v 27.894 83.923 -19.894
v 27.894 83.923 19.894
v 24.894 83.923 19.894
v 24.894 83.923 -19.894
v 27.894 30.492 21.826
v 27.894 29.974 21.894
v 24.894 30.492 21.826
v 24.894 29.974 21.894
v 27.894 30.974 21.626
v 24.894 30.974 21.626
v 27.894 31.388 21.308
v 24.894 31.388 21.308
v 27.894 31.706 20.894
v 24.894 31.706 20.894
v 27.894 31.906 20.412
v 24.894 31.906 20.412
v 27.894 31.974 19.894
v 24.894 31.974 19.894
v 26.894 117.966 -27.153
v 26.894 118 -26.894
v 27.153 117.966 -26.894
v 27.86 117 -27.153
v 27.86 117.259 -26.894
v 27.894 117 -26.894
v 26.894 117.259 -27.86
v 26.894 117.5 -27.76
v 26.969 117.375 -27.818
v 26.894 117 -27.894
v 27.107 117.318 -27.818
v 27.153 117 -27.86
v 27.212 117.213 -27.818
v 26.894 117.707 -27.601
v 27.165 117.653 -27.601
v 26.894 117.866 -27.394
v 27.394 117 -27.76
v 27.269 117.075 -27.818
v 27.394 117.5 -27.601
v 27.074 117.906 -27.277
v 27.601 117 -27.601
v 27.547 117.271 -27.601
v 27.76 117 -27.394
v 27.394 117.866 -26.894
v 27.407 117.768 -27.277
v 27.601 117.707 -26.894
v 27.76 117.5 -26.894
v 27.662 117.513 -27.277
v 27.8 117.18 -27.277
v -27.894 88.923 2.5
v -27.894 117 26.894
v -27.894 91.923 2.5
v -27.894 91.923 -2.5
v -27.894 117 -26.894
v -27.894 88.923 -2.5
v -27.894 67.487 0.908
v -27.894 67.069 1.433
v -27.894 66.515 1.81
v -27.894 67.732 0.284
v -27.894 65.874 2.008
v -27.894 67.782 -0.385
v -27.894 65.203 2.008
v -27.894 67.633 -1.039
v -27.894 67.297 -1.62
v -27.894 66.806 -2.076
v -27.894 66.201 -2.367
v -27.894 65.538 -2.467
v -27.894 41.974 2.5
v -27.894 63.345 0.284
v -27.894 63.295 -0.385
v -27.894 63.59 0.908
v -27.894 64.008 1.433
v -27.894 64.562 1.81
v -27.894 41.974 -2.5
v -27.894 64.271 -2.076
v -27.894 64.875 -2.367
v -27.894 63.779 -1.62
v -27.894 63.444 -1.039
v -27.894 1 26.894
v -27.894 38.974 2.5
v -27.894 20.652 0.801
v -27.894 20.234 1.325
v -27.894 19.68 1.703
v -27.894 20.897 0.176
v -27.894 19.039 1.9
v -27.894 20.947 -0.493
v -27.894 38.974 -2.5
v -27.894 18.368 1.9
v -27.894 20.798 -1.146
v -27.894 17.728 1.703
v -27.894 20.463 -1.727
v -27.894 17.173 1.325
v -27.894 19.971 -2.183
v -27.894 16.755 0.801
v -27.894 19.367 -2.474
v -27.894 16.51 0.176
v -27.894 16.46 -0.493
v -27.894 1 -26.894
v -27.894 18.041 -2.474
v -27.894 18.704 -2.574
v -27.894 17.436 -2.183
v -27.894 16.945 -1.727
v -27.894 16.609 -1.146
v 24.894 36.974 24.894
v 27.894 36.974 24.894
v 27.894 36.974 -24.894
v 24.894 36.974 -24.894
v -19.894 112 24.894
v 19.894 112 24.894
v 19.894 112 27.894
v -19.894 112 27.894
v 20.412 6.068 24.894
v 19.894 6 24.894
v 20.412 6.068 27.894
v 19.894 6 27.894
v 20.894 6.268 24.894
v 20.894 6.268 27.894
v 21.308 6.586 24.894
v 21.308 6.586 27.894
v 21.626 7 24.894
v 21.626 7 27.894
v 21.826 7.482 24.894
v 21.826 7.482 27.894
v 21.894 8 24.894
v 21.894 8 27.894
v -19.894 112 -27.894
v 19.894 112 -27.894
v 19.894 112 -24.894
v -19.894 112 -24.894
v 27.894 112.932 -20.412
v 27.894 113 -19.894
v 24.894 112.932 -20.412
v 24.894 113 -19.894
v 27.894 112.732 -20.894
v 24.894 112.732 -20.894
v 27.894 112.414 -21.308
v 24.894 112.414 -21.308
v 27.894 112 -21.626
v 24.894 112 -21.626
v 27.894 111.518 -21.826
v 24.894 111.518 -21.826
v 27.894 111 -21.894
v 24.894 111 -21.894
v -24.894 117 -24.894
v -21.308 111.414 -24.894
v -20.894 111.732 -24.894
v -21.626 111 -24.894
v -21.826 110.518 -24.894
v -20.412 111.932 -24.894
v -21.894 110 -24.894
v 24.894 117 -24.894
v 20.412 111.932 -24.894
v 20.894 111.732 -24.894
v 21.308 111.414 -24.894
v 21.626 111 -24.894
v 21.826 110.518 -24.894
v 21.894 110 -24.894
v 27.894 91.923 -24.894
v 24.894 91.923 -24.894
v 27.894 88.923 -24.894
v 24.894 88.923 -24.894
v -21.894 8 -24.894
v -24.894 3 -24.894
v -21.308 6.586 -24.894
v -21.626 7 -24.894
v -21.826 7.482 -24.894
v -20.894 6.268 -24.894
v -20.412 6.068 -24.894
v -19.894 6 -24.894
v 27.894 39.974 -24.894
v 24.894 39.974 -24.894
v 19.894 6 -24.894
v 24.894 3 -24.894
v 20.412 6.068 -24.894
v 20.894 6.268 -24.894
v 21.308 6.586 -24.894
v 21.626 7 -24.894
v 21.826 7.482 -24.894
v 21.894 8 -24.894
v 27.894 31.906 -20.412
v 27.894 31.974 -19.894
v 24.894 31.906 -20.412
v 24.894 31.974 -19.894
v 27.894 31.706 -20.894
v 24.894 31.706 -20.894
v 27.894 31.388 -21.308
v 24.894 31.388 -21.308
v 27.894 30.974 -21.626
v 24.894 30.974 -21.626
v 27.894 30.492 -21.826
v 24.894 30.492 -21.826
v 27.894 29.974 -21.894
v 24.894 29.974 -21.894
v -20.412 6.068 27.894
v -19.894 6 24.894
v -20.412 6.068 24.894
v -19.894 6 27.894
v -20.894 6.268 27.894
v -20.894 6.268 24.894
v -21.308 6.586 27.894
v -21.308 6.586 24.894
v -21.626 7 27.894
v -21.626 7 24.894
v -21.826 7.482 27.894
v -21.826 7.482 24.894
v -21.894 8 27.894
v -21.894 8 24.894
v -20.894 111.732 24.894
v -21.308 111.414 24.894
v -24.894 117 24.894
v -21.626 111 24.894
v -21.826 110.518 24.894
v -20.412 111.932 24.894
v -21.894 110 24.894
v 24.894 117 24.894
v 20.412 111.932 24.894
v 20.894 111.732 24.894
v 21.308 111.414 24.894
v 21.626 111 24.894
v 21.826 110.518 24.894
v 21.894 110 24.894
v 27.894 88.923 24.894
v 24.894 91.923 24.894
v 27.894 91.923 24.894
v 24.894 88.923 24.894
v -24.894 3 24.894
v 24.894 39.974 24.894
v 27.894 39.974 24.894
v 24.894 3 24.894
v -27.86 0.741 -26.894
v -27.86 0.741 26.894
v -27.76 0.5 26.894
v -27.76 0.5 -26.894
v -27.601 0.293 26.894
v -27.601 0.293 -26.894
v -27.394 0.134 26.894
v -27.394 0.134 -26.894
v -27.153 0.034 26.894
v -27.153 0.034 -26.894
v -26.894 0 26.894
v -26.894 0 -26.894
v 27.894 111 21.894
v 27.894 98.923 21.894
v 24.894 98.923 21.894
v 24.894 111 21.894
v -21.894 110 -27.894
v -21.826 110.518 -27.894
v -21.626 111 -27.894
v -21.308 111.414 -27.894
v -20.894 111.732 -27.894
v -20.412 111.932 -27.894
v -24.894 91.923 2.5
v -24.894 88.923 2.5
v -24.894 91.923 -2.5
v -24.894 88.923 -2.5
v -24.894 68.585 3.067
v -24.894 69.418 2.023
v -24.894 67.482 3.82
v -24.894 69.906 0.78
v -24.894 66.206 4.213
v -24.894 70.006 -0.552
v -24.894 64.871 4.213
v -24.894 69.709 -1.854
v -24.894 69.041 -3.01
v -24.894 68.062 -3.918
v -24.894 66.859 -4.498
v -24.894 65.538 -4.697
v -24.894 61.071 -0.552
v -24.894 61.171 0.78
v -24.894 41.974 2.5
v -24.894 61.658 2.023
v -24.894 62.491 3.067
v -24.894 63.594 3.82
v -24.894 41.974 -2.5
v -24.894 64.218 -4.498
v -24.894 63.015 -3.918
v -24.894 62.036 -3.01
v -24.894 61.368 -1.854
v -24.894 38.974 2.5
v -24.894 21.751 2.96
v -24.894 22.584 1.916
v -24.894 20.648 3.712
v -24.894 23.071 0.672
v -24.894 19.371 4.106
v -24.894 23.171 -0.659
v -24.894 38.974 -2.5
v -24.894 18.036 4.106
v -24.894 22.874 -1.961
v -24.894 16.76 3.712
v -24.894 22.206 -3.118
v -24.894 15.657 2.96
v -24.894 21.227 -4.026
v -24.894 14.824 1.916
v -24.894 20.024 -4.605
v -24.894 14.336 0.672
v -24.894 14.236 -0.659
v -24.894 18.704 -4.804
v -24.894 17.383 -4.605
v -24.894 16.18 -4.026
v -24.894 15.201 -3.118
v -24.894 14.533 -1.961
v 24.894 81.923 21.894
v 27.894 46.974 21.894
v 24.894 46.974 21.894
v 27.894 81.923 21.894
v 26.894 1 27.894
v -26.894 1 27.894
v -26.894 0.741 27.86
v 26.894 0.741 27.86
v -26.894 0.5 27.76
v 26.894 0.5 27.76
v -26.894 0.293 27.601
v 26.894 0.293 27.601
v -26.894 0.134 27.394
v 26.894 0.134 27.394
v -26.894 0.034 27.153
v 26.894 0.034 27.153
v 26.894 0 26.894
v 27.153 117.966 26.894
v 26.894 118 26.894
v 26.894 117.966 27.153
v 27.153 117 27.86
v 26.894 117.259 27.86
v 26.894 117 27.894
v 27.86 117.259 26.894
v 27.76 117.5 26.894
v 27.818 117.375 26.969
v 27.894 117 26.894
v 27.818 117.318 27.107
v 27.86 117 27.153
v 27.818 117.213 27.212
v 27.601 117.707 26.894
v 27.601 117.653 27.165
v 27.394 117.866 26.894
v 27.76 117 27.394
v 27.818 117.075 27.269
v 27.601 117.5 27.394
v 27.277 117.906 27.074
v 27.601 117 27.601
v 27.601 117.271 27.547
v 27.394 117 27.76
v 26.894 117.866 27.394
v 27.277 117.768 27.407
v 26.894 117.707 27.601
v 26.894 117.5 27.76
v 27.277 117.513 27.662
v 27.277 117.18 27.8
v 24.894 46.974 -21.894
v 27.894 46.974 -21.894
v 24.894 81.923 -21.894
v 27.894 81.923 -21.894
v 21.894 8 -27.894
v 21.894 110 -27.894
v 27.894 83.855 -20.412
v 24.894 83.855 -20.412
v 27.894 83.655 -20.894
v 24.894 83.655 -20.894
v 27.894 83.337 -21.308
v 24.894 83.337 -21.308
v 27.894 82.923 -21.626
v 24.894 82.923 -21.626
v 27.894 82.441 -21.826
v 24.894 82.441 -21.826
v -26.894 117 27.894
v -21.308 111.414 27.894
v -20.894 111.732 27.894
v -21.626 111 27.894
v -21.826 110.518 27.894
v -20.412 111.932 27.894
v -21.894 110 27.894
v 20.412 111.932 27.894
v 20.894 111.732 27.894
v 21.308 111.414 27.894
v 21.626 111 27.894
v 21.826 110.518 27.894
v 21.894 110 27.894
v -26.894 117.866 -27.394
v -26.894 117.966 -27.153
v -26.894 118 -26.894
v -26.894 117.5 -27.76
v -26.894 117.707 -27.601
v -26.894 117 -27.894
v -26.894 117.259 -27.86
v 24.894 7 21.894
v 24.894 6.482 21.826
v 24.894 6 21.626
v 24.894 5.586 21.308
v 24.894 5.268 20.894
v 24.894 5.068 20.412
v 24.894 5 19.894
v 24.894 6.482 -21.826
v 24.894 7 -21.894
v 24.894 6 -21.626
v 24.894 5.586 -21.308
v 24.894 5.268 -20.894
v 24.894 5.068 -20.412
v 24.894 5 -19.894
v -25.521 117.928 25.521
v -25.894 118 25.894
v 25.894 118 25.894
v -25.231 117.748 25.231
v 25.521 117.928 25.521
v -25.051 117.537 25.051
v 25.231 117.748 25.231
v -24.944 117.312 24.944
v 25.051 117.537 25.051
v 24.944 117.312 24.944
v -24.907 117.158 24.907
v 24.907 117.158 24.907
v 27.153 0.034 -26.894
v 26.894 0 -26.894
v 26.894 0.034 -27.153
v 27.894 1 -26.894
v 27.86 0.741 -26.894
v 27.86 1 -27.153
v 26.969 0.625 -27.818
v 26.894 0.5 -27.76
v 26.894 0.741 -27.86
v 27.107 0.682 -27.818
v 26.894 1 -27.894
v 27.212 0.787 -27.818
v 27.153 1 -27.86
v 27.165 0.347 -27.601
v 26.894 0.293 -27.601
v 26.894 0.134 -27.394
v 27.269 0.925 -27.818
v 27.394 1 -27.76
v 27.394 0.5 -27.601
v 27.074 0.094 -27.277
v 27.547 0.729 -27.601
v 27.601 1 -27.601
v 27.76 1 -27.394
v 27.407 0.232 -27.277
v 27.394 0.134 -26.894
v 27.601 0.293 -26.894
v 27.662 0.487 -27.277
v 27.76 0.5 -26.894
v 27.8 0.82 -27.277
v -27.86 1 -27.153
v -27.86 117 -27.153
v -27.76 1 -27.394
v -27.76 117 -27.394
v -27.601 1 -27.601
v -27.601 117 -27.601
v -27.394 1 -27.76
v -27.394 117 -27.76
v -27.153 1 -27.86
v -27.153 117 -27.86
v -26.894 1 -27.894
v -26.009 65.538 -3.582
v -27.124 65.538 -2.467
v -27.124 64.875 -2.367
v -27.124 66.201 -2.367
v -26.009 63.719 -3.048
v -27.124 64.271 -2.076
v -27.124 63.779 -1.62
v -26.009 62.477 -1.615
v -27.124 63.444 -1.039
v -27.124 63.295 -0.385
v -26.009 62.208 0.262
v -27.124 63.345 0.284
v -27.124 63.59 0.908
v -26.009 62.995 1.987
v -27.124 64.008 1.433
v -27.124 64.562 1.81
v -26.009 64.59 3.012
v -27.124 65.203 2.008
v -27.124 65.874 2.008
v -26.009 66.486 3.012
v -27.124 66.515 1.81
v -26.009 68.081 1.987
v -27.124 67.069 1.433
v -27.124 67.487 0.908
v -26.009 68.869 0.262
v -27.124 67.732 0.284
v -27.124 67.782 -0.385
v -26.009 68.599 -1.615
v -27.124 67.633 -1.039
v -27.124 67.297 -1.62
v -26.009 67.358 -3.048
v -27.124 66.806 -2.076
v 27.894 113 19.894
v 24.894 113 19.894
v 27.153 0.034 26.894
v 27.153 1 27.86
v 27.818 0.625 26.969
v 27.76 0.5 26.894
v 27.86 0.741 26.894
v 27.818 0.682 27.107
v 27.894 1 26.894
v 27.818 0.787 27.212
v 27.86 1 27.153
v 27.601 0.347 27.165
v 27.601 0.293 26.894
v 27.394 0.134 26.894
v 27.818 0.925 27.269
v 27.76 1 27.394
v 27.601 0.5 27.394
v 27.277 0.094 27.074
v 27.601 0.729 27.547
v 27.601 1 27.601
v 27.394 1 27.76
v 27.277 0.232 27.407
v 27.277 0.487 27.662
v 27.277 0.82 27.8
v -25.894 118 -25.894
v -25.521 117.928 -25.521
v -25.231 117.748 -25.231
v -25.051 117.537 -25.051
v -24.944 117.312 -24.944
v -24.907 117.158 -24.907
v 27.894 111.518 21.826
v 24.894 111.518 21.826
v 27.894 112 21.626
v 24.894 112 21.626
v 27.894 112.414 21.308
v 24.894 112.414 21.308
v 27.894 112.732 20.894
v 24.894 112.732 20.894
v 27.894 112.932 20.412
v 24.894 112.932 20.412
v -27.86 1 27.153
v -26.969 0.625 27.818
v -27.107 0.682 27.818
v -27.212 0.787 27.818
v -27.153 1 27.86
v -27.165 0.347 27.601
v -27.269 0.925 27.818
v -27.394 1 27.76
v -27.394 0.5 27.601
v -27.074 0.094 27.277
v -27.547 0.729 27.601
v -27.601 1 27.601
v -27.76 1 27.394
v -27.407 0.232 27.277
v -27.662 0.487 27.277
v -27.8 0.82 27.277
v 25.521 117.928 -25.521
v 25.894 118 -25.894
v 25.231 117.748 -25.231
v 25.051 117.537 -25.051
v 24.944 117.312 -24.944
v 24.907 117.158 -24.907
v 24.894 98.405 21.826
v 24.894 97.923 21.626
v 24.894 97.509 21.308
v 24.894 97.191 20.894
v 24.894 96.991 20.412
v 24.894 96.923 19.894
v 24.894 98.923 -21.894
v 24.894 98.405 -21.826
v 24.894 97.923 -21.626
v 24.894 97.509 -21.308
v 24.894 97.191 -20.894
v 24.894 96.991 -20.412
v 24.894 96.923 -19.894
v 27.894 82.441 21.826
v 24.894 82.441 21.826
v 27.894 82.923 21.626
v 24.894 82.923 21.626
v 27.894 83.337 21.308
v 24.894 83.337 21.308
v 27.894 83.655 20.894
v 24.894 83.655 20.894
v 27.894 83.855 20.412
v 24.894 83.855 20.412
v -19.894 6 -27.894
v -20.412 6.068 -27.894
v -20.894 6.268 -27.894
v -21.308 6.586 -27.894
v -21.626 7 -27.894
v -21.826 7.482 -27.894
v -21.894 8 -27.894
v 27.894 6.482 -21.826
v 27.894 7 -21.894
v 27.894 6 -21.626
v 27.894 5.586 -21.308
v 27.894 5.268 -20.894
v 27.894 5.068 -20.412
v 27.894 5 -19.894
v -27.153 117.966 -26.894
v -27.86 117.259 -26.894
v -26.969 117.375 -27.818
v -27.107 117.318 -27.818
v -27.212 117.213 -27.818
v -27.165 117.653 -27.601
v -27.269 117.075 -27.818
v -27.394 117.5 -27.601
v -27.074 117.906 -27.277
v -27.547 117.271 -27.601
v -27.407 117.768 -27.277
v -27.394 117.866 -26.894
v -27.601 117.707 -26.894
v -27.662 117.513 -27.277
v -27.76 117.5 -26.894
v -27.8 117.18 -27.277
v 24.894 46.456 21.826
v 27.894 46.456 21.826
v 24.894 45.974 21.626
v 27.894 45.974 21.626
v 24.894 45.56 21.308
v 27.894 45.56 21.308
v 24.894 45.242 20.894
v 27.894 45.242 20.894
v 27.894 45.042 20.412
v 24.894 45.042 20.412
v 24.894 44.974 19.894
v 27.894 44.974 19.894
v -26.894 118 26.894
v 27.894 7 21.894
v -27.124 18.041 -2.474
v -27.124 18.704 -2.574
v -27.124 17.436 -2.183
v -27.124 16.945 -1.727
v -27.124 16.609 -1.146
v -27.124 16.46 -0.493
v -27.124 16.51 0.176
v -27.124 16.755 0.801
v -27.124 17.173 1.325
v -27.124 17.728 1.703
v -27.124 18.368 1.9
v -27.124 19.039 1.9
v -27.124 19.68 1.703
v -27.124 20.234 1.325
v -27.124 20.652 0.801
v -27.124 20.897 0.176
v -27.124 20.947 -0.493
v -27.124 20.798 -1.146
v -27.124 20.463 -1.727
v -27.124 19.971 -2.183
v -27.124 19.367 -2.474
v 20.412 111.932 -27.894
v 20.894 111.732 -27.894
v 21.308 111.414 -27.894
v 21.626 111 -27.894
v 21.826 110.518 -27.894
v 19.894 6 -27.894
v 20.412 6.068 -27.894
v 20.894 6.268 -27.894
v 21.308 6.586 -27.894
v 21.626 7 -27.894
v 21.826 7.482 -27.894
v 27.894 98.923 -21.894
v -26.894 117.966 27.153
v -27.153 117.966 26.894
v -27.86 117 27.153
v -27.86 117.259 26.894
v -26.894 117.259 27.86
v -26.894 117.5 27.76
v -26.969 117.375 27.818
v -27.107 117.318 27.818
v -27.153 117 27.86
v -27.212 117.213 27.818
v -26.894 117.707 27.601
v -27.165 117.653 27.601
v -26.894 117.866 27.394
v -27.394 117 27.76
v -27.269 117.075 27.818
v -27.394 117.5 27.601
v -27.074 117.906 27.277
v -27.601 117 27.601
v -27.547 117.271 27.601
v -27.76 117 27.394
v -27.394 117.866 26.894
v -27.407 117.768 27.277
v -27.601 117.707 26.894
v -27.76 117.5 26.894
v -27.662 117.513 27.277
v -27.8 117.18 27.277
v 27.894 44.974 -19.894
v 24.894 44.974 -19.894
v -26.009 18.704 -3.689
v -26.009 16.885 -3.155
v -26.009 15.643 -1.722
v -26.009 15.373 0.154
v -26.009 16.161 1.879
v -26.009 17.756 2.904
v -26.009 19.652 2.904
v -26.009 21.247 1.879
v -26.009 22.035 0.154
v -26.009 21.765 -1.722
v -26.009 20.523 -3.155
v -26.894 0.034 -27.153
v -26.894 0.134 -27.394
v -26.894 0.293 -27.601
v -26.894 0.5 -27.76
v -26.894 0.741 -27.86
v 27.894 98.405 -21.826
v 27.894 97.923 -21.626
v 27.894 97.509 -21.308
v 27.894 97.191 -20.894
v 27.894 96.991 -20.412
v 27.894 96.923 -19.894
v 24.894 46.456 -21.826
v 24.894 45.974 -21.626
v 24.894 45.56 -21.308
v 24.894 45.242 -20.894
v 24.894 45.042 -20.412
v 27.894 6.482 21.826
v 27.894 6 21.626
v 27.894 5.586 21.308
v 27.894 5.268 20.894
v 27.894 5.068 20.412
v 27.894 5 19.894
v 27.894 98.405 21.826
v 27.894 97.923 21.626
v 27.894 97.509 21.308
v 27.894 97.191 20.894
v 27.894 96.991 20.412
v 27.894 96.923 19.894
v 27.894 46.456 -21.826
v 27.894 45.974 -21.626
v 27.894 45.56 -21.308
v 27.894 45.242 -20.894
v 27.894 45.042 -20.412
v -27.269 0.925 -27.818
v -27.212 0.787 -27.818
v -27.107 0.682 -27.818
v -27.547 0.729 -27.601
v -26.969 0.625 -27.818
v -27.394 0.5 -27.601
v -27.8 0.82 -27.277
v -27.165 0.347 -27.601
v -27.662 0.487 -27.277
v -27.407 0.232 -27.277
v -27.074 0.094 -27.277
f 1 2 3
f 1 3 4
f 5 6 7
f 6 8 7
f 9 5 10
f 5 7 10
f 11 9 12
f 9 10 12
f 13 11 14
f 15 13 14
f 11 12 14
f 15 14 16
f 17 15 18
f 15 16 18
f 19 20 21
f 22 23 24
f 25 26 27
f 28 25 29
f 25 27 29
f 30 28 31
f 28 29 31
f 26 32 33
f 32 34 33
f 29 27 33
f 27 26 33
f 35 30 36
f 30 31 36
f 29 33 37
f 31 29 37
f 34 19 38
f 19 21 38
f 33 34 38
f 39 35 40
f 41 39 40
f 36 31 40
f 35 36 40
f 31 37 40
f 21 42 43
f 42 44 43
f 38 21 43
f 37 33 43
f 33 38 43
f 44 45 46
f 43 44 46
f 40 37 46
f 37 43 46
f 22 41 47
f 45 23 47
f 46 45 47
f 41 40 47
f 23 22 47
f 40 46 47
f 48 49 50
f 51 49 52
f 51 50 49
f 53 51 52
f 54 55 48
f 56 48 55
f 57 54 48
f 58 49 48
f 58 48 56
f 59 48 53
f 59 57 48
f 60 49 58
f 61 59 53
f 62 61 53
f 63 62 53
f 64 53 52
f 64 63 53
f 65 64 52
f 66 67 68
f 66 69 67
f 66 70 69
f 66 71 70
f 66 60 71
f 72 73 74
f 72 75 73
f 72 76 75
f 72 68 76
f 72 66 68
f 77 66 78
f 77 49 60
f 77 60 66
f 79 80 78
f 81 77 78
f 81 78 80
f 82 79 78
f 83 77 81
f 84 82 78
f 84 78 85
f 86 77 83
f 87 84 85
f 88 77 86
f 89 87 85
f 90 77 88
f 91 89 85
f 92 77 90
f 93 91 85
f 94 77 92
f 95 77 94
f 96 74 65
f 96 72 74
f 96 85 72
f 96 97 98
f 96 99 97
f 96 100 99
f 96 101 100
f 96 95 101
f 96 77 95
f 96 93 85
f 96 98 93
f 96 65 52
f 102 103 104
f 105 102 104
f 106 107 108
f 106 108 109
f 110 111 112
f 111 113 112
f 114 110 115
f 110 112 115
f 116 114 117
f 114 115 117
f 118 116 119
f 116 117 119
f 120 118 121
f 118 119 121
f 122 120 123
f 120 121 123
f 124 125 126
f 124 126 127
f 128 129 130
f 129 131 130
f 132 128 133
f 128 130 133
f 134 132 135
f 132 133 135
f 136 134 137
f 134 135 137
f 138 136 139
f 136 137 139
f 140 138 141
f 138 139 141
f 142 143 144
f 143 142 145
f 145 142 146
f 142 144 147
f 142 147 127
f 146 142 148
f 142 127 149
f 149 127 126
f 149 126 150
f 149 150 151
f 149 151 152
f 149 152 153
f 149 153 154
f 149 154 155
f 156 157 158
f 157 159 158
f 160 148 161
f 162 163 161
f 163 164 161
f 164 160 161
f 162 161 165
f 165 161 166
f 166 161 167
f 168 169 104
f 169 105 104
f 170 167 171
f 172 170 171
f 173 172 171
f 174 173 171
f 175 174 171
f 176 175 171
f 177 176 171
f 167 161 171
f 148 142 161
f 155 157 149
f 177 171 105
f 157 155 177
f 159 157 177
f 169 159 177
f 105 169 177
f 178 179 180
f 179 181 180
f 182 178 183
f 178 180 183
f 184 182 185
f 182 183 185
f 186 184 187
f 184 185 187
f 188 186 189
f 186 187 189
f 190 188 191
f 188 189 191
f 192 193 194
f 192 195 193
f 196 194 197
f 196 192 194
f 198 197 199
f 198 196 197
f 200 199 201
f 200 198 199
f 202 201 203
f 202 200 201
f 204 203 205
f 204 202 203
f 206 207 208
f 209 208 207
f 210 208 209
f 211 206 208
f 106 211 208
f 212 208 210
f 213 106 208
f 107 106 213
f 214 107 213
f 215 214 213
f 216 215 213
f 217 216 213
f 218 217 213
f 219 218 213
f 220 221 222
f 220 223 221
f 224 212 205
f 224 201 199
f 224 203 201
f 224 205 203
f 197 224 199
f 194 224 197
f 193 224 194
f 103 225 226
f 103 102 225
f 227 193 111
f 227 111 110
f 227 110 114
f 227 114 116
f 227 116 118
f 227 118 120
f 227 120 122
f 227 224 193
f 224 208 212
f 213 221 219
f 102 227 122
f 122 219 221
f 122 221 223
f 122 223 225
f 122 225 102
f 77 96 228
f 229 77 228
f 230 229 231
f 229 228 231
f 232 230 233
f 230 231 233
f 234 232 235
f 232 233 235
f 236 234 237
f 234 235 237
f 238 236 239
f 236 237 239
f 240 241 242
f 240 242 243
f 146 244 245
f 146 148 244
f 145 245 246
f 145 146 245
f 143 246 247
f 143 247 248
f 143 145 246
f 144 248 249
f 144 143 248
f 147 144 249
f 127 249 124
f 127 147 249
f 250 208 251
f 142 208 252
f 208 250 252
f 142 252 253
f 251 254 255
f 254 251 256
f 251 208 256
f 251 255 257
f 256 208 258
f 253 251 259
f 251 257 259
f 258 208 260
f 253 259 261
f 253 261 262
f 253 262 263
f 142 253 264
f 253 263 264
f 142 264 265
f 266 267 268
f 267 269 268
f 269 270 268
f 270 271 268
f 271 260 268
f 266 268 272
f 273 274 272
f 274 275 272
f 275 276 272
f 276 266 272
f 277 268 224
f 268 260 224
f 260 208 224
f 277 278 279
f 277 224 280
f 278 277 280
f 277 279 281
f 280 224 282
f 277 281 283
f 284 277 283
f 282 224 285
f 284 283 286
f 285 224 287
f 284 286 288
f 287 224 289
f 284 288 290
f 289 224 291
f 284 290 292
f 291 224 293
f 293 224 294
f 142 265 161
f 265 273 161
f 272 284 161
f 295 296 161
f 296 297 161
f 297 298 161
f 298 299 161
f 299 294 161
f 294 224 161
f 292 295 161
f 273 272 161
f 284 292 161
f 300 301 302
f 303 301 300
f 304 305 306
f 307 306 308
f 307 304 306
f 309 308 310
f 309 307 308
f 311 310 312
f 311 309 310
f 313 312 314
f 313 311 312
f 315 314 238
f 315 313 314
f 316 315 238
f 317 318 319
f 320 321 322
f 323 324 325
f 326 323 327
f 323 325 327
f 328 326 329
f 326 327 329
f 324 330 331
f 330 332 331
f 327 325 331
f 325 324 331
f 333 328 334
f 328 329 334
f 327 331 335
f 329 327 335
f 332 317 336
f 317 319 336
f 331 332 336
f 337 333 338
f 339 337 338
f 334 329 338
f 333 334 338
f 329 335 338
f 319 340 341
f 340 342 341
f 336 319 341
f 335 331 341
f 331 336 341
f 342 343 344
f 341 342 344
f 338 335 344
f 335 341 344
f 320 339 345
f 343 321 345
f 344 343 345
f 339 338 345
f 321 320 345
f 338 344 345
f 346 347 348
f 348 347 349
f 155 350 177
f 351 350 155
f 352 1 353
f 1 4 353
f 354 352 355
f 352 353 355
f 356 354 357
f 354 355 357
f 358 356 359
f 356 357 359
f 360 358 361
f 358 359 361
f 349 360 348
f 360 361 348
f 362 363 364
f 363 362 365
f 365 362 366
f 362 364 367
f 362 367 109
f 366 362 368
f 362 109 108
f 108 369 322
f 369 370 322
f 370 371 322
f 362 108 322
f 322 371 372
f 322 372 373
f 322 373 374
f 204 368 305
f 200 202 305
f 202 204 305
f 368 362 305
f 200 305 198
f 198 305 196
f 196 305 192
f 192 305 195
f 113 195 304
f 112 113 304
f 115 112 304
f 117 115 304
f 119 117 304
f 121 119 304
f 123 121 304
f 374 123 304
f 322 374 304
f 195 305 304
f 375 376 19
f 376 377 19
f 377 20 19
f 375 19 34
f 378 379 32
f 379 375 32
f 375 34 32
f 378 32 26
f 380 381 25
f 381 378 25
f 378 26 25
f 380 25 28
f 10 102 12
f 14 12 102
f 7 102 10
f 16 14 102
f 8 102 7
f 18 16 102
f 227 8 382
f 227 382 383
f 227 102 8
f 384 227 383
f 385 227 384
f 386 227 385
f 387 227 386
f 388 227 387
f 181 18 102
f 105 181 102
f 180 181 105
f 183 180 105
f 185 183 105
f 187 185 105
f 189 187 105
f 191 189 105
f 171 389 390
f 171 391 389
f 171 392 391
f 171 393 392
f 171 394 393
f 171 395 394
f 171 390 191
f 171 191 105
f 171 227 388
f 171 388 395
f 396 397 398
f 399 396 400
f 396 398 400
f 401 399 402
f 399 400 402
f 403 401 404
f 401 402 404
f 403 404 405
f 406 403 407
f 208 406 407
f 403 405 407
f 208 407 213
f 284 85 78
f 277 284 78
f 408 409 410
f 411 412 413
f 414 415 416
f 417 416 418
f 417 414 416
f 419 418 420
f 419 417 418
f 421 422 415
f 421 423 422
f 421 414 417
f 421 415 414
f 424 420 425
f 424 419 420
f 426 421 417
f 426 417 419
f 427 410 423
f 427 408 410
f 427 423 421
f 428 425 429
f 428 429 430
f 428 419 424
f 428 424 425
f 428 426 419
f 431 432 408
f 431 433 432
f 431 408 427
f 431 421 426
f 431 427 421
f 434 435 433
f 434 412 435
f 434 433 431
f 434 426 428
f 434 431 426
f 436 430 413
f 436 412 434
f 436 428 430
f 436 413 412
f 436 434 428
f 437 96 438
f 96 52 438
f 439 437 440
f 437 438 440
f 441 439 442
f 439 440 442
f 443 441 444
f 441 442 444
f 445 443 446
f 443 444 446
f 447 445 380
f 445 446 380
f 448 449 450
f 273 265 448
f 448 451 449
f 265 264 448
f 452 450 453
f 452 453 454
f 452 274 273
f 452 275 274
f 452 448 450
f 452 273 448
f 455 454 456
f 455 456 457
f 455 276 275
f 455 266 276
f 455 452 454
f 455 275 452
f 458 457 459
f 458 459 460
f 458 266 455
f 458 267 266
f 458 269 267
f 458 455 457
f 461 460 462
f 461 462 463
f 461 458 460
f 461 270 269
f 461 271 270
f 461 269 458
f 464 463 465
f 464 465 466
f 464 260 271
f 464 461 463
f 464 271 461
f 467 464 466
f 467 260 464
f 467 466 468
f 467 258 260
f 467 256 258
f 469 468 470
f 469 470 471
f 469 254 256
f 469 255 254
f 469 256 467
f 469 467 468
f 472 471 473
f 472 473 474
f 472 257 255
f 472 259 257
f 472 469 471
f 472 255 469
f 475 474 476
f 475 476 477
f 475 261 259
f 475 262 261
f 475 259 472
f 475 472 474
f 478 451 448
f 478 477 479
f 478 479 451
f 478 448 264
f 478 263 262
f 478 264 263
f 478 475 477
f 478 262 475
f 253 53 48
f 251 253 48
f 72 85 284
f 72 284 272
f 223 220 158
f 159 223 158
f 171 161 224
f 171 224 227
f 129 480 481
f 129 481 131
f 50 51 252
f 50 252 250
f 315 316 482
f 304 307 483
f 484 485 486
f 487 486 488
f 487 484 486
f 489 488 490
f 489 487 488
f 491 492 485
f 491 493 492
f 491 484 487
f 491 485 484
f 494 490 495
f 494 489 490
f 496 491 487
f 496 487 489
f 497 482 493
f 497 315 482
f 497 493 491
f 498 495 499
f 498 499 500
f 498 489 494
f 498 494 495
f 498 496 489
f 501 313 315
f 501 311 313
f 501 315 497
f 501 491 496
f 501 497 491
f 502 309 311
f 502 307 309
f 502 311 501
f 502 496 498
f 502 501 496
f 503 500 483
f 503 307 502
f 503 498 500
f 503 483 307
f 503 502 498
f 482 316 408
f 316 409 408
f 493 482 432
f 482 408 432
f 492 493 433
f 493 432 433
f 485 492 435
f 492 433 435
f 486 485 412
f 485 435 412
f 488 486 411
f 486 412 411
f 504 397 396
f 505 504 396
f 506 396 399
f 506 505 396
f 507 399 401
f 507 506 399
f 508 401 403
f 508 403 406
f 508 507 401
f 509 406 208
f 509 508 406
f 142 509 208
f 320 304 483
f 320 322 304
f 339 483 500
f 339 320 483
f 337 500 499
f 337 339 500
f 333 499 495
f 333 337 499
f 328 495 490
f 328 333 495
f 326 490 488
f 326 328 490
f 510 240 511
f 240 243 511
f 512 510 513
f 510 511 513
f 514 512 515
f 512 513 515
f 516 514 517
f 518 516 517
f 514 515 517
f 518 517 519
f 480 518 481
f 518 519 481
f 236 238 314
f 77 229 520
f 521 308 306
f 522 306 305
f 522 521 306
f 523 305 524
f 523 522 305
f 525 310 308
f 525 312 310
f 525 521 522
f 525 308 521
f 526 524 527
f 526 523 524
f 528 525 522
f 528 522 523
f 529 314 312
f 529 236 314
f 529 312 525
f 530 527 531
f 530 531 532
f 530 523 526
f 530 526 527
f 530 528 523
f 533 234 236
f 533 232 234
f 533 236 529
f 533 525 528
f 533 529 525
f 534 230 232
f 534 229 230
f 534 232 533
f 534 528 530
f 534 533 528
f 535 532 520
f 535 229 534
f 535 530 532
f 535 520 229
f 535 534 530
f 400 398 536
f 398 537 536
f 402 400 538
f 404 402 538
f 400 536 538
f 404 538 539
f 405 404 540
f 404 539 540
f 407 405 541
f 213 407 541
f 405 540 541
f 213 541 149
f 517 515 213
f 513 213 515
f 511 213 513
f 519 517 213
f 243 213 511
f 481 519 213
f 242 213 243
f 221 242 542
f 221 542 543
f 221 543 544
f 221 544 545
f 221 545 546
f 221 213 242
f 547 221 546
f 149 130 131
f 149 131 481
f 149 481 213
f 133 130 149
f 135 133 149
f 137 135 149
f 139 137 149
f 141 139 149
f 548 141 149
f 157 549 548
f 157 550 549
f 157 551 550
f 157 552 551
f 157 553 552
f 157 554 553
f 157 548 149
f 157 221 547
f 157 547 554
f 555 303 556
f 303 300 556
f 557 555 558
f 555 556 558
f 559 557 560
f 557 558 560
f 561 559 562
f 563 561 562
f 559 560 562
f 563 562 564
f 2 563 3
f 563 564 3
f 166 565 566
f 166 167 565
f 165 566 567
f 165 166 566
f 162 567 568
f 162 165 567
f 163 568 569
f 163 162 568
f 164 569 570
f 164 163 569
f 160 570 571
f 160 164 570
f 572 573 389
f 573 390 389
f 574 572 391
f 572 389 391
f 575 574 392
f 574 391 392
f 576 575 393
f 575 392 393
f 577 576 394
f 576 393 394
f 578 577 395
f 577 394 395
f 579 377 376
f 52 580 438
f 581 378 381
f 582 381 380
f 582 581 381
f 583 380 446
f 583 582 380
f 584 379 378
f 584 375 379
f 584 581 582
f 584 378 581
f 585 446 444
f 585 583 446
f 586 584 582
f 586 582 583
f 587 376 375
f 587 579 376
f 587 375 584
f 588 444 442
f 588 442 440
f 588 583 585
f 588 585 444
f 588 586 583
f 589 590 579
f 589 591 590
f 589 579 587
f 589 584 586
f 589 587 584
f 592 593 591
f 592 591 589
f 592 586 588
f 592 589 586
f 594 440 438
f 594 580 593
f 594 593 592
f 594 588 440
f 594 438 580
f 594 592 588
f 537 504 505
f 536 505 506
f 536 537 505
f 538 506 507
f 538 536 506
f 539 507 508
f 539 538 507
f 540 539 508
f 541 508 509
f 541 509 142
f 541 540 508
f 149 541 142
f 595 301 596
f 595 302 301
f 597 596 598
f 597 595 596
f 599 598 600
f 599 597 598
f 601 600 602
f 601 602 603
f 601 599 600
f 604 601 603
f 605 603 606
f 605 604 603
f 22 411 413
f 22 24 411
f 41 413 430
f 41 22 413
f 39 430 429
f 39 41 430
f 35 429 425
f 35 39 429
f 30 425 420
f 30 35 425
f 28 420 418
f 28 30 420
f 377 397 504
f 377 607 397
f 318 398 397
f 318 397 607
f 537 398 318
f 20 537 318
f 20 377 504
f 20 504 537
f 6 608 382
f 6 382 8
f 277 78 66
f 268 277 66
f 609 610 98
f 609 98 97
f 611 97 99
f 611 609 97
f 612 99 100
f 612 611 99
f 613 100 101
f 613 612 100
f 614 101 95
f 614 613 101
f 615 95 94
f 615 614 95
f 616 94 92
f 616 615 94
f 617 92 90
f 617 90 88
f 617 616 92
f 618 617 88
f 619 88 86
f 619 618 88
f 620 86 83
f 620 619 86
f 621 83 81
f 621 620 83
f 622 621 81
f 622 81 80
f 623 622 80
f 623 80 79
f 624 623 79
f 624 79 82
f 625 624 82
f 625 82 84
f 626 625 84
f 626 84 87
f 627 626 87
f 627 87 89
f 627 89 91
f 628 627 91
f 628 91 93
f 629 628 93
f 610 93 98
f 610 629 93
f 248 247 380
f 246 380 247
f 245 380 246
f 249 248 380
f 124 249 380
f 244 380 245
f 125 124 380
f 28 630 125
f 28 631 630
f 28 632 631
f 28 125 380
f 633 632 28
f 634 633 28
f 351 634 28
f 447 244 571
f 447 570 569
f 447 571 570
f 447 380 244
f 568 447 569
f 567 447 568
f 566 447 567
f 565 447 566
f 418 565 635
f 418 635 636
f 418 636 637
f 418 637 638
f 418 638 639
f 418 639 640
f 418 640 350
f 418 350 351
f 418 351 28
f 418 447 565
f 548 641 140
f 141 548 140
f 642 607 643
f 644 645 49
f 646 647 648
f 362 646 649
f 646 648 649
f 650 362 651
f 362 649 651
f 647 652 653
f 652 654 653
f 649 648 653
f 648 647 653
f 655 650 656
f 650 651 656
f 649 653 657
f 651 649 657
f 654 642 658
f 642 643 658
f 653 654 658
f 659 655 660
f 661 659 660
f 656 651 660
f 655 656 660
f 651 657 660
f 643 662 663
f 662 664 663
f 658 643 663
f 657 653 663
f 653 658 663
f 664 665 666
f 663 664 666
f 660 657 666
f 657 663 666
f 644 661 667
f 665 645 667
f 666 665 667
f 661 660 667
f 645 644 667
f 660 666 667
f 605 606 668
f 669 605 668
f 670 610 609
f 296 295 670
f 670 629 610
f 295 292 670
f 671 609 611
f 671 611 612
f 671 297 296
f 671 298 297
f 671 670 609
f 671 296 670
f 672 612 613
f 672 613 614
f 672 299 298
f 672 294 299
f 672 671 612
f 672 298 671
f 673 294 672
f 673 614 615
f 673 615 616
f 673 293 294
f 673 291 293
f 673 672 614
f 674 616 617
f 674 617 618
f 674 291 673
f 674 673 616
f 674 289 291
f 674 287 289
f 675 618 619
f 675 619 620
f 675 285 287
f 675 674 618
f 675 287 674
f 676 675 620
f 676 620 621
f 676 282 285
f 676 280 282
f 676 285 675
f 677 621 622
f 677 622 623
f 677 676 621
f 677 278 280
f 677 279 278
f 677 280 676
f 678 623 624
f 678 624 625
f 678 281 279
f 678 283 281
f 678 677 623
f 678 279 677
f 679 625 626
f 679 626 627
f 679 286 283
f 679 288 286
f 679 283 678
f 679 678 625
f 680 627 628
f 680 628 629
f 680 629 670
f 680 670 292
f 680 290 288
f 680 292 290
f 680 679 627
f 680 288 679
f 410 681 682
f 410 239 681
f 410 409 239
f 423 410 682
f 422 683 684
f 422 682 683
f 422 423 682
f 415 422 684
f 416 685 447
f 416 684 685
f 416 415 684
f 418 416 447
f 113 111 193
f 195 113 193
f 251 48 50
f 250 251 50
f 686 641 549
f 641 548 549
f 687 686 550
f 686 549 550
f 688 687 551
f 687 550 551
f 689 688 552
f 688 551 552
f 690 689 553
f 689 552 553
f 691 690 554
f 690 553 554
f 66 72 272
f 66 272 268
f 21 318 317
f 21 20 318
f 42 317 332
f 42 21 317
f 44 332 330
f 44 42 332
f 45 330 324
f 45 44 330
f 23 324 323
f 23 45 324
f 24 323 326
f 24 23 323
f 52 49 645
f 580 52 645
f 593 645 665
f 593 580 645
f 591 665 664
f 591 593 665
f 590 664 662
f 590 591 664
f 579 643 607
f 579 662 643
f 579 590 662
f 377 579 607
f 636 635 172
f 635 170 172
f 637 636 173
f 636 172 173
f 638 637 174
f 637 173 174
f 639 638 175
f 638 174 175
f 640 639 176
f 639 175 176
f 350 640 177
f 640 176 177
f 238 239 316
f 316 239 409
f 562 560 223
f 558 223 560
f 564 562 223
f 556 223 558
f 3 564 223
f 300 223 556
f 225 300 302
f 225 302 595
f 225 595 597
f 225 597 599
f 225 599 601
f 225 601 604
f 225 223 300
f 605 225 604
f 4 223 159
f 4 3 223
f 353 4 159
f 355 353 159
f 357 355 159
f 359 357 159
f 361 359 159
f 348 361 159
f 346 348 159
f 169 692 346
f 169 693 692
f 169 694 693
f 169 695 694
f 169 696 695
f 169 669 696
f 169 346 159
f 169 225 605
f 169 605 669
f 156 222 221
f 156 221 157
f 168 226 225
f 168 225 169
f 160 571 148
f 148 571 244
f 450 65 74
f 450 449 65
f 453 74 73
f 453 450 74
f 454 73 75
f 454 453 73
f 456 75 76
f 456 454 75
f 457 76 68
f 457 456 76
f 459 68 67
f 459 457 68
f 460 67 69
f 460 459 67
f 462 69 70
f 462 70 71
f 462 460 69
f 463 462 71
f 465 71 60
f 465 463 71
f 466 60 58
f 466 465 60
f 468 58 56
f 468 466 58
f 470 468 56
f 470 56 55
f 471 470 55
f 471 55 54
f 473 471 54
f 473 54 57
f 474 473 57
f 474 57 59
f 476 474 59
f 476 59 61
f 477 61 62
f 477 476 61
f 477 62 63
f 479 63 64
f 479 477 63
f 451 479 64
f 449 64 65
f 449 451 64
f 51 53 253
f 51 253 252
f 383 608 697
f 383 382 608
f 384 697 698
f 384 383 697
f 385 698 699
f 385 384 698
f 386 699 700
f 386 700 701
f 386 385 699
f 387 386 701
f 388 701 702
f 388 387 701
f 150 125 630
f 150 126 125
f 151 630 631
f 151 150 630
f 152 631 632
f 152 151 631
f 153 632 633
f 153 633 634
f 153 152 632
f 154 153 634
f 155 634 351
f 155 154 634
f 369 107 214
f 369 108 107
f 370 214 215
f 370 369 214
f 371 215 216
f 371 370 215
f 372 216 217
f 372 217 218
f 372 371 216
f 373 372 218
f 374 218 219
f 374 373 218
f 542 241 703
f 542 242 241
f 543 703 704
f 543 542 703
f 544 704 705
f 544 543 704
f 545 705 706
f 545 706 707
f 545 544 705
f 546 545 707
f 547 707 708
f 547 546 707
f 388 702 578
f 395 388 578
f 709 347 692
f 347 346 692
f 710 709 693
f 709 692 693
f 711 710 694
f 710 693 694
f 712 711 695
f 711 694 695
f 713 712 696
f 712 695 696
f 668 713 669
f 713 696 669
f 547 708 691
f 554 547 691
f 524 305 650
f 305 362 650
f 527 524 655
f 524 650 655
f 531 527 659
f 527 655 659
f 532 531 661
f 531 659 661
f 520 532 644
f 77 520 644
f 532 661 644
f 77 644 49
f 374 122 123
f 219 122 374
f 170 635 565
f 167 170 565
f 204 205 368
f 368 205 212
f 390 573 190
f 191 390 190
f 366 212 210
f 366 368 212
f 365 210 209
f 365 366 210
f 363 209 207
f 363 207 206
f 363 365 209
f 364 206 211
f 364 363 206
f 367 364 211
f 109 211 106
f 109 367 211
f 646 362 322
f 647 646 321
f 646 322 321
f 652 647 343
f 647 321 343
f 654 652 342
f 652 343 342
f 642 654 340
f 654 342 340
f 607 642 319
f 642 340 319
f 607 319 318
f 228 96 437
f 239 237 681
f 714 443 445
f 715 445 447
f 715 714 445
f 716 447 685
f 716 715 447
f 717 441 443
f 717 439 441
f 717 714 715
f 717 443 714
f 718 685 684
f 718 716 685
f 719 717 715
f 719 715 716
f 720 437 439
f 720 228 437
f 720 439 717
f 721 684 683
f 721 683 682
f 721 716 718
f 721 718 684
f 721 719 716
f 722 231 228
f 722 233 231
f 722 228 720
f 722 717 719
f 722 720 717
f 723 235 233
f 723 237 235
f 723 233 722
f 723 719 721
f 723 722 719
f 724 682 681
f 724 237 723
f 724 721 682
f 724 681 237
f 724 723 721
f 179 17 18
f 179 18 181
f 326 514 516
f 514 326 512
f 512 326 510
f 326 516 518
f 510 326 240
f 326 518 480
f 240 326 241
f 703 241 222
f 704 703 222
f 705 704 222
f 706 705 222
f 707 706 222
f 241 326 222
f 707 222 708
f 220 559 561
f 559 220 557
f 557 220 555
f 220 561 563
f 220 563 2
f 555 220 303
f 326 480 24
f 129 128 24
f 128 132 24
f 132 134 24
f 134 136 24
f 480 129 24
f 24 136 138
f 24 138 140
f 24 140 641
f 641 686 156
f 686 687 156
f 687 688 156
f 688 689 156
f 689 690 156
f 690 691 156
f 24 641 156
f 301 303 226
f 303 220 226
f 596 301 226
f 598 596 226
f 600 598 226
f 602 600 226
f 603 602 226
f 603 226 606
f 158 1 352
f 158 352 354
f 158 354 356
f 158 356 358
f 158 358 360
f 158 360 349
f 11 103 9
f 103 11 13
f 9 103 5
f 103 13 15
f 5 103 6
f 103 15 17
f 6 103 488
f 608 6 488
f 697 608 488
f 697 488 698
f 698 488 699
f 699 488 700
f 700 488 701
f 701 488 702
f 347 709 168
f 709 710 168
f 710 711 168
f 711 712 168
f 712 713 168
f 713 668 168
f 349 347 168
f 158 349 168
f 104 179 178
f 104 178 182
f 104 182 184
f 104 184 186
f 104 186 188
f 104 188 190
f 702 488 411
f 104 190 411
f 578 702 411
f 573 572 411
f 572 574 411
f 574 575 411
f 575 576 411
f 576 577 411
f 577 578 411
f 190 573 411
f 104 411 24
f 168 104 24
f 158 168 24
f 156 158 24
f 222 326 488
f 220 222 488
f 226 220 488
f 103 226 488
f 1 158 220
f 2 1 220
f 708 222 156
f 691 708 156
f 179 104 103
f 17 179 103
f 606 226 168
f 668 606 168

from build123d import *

# Parameters (mm, degrees)
SKETCH1_W                    = 49.788
SKETCH1_H                    = 49.788
BOSS_EXTRUDE1_DEPTH          = 3
SKETCH1_3_W                  = 55.788
SKETCH1_3_H                  = 55.788
SKETCH1_3_W_2                = 49.788
SKETCH1_3_H_2                = 49.788
BOSS_EXTRUDE2_DEPTH          = 118
SKETCH2_W                    = 49.788
SKETCH2_H                    = 3
SKETCH2_W_2                  = 43.788
SKETCH2_H_2                  = 38.949
SKETCH2_H_3                  = 26.974
SKETCH2_H_4                  = 16.077
CUT_EXTRUDE1_DEPTH           = 3
FILLET1_R                    = 2
SKETCH3_W                    = 43.788
SKETCH3_H                    = 106
CUT_EXTRUDE2_DEPTH           = 56
FILLET2_R                    = 2
SKETCH4_W                    = 5
SKETCH4_H                    = 3
CUT_EXTRUDE3_DEPTH           = 3
CSK_FOR_M4_SFHCS1_AT_2_COUNT = 2
CSK_FOR_M4_SFHCS1_AT_2_PITCH = 46.834641181
CSK_FOR_M4_SFHCS1_AT_3_COUNT = 2
CSK_FOR_M4_SFHCS1_AT_3_PITCH = 46.834641181
FILLET3_R                    = 1


with BuildPart() as part:
    # Sketch1 → Boss-Extrude1 (new body)
    with BuildSketch(Plane(origin=(0, 0, 0), x_dir=(1, 0, 0), z_dir=(0, 1, 0))):
        Rectangle(SKETCH1_W, SKETCH1_H)
    extrude(amount=BOSS_EXTRUDE1_DEPTH)

    # Sketch1<3> → Boss-Extrude2 (add)
    with BuildSketch(Plane(origin=(0, 0, 0), x_dir=(1, 0, 0), z_dir=(0, 1, 0))):
        Rectangle(SKETCH1_3_W, SKETCH1_3_H)
        Rectangle(SKETCH1_3_W_2, SKETCH1_3_H_2, mode=Mode.SUBTRACT)
    extrude(amount=BOSS_EXTRUDE2_DEPTH)

    # Sketch2 → Cut-Extrude1 (cut)
    with BuildSketch(Plane(origin=(27.894, 0, 0), x_dir=(0, 0, -1), z_dir=(1, 0, 0))):
        with Locations((0, 90.423)):
            Rectangle(SKETCH2_W, SKETCH2_H)
        with Locations((0, 38.474)):
            Rectangle(SKETCH2_W, SKETCH2_H)
        with Locations((0, 64.4485)):
            Rectangle(SKETCH2_W_2, SKETCH2_H_2)
        with Locations((0, 18.487)):
            Rectangle(SKETCH2_W_2, SKETCH2_H_3)
        with Locations((0, 104.9615)):
            Rectangle(SKETCH2_W_2, SKETCH2_H_4)
    extrude(amount=-CUT_EXTRUDE1_DEPTH, mode=Mode.SUBTRACT)

    # Fillet1
    fillet1_edges = [part.edges().sort_by_distance(p)[0] for p in [
        (26.394, 5, -21.894),
        (26.394, 31.974, -21.894),
        (26.394, 31.974, 21.894),
        (26.394, 5, 21.894),
        (26.394, 44.974, -21.894),
        (26.394, 83.923, -21.894),
        (26.394, 83.923, 21.894),
        (26.394, 44.974, 21.894),
        (26.394, 96.923, 21.894),
        (26.394, 113, 21.894),
        (26.394, 113, -21.894),
        (26.394, 96.923, -21.894),
    ]]
    fillet(fillet1_edges, radius=FILLET1_R)

    # Sketch3 → Cut-Extrude2 (cut)
    with BuildSketch(Plane(origin=(0, 0, -27.894), x_dir=(-1, 0, 0), z_dir=(0, 0, -1))):
        with Locations((0, 59)):
            Rectangle(SKETCH3_W, SKETCH3_H)
    extrude(amount=-CUT_EXTRUDE2_DEPTH, mode=Mode.SUBTRACT)

    # Fillet2
    fillet2_edges = [part.edges().sort_by_distance(p)[0] for p in [
        (21.894, 112, 26.394),
        (-21.894, 112, 26.394),
        (-21.894, 6, 26.394),
        (21.894, 6, 26.394),
        (21.894, 6, -26.394),
        (21.894, 112, -26.394),
        (-21.894, 112, -26.394),
        (-21.894, 6, -26.394),
    ]]
    fillet(fillet2_edges, radius=FILLET2_R)

    # Sketch4 → Cut-Extrude3 (cut)
    with BuildSketch(Plane.ZY.offset(27.894)):
        with Locations((0, 90.423)):
            Rectangle(SKETCH4_W, SKETCH4_H)
        with Locations((0, 40.474)):
            Rectangle(SKETCH4_W, SKETCH4_H)
    extrude(amount=-CUT_EXTRUDE3_DEPTH, mode=Mode.SUBTRACT)

    # Sketch7 → CSK for M4 SFHCS1 (revolve, cut)
    with BuildSketch(Plane(origin=(-24.894, 65.538290214, -0.216772751), x_dir=(0, 0, -1), z_dir=(0, 1, 0))):
        Polygon((0, 0), (0, 3), (2.25, 3), (2.25, 2.23), (4.48, 0), align=None)
    csk_for_m4_sfhcs1 = revolve(axis=Axis((-18.544, 65.538290214, -0.216772751), (-1, 0, 0)), mode=Mode.SUBTRACT)

    # CSK for M4 SFHCS1 at 2: CSK for M4 SFHCS1 ×2
    with Locations(*[Vector(0, -0.999997358387733, -0.002298525082753328) * (i * CSK_FOR_M4_SFHCS1_AT_2_PITCH) for i in range(1, CSK_FOR_M4_SFHCS1_AT_2_COUNT)]):
        add(csk_for_m4_sfhcs1, mode=Mode.SUBTRACT)

    # CSK for M4 SFHCS1 at 3: CSK for M4 SFHCS1 ×2
    with Locations(*[Vector(0, -0.999997358387733, -0.002298525082753328) * (i * CSK_FOR_M4_SFHCS1_AT_3_PITCH) for i in range(1, CSK_FOR_M4_SFHCS1_AT_3_COUNT)]):
        add(csk_for_m4_sfhcs1, mode=Mode.SUBTRACT)

    # Fillet3
    fillet3_edges = [part.edges().sort_by_distance(p)[0] for p in [
        (0, 118, -27.894),
        (-27.894, 118, 0),
        (-24.894, 118, 0),
        (0, 118, -24.894),
        (0, 118, 27.894),
        (0, 118, 24.894),
        (24.894, 118, 0),
        (27.894, 118, 0),
        (0, 0, -27.894),
        (27.894, 0, 0),
        (0, 0, 27.894),
        (-27.894, 59, 27.894),
        (27.894, 59, 27.894),
        (-27.894, 59, -27.894),
        (27.894, 59, -27.894),
        (-27.894, 0, 0),
    ]]
    fillet(fillet3_edges, radius=FILLET3_R)


solid = part.part
